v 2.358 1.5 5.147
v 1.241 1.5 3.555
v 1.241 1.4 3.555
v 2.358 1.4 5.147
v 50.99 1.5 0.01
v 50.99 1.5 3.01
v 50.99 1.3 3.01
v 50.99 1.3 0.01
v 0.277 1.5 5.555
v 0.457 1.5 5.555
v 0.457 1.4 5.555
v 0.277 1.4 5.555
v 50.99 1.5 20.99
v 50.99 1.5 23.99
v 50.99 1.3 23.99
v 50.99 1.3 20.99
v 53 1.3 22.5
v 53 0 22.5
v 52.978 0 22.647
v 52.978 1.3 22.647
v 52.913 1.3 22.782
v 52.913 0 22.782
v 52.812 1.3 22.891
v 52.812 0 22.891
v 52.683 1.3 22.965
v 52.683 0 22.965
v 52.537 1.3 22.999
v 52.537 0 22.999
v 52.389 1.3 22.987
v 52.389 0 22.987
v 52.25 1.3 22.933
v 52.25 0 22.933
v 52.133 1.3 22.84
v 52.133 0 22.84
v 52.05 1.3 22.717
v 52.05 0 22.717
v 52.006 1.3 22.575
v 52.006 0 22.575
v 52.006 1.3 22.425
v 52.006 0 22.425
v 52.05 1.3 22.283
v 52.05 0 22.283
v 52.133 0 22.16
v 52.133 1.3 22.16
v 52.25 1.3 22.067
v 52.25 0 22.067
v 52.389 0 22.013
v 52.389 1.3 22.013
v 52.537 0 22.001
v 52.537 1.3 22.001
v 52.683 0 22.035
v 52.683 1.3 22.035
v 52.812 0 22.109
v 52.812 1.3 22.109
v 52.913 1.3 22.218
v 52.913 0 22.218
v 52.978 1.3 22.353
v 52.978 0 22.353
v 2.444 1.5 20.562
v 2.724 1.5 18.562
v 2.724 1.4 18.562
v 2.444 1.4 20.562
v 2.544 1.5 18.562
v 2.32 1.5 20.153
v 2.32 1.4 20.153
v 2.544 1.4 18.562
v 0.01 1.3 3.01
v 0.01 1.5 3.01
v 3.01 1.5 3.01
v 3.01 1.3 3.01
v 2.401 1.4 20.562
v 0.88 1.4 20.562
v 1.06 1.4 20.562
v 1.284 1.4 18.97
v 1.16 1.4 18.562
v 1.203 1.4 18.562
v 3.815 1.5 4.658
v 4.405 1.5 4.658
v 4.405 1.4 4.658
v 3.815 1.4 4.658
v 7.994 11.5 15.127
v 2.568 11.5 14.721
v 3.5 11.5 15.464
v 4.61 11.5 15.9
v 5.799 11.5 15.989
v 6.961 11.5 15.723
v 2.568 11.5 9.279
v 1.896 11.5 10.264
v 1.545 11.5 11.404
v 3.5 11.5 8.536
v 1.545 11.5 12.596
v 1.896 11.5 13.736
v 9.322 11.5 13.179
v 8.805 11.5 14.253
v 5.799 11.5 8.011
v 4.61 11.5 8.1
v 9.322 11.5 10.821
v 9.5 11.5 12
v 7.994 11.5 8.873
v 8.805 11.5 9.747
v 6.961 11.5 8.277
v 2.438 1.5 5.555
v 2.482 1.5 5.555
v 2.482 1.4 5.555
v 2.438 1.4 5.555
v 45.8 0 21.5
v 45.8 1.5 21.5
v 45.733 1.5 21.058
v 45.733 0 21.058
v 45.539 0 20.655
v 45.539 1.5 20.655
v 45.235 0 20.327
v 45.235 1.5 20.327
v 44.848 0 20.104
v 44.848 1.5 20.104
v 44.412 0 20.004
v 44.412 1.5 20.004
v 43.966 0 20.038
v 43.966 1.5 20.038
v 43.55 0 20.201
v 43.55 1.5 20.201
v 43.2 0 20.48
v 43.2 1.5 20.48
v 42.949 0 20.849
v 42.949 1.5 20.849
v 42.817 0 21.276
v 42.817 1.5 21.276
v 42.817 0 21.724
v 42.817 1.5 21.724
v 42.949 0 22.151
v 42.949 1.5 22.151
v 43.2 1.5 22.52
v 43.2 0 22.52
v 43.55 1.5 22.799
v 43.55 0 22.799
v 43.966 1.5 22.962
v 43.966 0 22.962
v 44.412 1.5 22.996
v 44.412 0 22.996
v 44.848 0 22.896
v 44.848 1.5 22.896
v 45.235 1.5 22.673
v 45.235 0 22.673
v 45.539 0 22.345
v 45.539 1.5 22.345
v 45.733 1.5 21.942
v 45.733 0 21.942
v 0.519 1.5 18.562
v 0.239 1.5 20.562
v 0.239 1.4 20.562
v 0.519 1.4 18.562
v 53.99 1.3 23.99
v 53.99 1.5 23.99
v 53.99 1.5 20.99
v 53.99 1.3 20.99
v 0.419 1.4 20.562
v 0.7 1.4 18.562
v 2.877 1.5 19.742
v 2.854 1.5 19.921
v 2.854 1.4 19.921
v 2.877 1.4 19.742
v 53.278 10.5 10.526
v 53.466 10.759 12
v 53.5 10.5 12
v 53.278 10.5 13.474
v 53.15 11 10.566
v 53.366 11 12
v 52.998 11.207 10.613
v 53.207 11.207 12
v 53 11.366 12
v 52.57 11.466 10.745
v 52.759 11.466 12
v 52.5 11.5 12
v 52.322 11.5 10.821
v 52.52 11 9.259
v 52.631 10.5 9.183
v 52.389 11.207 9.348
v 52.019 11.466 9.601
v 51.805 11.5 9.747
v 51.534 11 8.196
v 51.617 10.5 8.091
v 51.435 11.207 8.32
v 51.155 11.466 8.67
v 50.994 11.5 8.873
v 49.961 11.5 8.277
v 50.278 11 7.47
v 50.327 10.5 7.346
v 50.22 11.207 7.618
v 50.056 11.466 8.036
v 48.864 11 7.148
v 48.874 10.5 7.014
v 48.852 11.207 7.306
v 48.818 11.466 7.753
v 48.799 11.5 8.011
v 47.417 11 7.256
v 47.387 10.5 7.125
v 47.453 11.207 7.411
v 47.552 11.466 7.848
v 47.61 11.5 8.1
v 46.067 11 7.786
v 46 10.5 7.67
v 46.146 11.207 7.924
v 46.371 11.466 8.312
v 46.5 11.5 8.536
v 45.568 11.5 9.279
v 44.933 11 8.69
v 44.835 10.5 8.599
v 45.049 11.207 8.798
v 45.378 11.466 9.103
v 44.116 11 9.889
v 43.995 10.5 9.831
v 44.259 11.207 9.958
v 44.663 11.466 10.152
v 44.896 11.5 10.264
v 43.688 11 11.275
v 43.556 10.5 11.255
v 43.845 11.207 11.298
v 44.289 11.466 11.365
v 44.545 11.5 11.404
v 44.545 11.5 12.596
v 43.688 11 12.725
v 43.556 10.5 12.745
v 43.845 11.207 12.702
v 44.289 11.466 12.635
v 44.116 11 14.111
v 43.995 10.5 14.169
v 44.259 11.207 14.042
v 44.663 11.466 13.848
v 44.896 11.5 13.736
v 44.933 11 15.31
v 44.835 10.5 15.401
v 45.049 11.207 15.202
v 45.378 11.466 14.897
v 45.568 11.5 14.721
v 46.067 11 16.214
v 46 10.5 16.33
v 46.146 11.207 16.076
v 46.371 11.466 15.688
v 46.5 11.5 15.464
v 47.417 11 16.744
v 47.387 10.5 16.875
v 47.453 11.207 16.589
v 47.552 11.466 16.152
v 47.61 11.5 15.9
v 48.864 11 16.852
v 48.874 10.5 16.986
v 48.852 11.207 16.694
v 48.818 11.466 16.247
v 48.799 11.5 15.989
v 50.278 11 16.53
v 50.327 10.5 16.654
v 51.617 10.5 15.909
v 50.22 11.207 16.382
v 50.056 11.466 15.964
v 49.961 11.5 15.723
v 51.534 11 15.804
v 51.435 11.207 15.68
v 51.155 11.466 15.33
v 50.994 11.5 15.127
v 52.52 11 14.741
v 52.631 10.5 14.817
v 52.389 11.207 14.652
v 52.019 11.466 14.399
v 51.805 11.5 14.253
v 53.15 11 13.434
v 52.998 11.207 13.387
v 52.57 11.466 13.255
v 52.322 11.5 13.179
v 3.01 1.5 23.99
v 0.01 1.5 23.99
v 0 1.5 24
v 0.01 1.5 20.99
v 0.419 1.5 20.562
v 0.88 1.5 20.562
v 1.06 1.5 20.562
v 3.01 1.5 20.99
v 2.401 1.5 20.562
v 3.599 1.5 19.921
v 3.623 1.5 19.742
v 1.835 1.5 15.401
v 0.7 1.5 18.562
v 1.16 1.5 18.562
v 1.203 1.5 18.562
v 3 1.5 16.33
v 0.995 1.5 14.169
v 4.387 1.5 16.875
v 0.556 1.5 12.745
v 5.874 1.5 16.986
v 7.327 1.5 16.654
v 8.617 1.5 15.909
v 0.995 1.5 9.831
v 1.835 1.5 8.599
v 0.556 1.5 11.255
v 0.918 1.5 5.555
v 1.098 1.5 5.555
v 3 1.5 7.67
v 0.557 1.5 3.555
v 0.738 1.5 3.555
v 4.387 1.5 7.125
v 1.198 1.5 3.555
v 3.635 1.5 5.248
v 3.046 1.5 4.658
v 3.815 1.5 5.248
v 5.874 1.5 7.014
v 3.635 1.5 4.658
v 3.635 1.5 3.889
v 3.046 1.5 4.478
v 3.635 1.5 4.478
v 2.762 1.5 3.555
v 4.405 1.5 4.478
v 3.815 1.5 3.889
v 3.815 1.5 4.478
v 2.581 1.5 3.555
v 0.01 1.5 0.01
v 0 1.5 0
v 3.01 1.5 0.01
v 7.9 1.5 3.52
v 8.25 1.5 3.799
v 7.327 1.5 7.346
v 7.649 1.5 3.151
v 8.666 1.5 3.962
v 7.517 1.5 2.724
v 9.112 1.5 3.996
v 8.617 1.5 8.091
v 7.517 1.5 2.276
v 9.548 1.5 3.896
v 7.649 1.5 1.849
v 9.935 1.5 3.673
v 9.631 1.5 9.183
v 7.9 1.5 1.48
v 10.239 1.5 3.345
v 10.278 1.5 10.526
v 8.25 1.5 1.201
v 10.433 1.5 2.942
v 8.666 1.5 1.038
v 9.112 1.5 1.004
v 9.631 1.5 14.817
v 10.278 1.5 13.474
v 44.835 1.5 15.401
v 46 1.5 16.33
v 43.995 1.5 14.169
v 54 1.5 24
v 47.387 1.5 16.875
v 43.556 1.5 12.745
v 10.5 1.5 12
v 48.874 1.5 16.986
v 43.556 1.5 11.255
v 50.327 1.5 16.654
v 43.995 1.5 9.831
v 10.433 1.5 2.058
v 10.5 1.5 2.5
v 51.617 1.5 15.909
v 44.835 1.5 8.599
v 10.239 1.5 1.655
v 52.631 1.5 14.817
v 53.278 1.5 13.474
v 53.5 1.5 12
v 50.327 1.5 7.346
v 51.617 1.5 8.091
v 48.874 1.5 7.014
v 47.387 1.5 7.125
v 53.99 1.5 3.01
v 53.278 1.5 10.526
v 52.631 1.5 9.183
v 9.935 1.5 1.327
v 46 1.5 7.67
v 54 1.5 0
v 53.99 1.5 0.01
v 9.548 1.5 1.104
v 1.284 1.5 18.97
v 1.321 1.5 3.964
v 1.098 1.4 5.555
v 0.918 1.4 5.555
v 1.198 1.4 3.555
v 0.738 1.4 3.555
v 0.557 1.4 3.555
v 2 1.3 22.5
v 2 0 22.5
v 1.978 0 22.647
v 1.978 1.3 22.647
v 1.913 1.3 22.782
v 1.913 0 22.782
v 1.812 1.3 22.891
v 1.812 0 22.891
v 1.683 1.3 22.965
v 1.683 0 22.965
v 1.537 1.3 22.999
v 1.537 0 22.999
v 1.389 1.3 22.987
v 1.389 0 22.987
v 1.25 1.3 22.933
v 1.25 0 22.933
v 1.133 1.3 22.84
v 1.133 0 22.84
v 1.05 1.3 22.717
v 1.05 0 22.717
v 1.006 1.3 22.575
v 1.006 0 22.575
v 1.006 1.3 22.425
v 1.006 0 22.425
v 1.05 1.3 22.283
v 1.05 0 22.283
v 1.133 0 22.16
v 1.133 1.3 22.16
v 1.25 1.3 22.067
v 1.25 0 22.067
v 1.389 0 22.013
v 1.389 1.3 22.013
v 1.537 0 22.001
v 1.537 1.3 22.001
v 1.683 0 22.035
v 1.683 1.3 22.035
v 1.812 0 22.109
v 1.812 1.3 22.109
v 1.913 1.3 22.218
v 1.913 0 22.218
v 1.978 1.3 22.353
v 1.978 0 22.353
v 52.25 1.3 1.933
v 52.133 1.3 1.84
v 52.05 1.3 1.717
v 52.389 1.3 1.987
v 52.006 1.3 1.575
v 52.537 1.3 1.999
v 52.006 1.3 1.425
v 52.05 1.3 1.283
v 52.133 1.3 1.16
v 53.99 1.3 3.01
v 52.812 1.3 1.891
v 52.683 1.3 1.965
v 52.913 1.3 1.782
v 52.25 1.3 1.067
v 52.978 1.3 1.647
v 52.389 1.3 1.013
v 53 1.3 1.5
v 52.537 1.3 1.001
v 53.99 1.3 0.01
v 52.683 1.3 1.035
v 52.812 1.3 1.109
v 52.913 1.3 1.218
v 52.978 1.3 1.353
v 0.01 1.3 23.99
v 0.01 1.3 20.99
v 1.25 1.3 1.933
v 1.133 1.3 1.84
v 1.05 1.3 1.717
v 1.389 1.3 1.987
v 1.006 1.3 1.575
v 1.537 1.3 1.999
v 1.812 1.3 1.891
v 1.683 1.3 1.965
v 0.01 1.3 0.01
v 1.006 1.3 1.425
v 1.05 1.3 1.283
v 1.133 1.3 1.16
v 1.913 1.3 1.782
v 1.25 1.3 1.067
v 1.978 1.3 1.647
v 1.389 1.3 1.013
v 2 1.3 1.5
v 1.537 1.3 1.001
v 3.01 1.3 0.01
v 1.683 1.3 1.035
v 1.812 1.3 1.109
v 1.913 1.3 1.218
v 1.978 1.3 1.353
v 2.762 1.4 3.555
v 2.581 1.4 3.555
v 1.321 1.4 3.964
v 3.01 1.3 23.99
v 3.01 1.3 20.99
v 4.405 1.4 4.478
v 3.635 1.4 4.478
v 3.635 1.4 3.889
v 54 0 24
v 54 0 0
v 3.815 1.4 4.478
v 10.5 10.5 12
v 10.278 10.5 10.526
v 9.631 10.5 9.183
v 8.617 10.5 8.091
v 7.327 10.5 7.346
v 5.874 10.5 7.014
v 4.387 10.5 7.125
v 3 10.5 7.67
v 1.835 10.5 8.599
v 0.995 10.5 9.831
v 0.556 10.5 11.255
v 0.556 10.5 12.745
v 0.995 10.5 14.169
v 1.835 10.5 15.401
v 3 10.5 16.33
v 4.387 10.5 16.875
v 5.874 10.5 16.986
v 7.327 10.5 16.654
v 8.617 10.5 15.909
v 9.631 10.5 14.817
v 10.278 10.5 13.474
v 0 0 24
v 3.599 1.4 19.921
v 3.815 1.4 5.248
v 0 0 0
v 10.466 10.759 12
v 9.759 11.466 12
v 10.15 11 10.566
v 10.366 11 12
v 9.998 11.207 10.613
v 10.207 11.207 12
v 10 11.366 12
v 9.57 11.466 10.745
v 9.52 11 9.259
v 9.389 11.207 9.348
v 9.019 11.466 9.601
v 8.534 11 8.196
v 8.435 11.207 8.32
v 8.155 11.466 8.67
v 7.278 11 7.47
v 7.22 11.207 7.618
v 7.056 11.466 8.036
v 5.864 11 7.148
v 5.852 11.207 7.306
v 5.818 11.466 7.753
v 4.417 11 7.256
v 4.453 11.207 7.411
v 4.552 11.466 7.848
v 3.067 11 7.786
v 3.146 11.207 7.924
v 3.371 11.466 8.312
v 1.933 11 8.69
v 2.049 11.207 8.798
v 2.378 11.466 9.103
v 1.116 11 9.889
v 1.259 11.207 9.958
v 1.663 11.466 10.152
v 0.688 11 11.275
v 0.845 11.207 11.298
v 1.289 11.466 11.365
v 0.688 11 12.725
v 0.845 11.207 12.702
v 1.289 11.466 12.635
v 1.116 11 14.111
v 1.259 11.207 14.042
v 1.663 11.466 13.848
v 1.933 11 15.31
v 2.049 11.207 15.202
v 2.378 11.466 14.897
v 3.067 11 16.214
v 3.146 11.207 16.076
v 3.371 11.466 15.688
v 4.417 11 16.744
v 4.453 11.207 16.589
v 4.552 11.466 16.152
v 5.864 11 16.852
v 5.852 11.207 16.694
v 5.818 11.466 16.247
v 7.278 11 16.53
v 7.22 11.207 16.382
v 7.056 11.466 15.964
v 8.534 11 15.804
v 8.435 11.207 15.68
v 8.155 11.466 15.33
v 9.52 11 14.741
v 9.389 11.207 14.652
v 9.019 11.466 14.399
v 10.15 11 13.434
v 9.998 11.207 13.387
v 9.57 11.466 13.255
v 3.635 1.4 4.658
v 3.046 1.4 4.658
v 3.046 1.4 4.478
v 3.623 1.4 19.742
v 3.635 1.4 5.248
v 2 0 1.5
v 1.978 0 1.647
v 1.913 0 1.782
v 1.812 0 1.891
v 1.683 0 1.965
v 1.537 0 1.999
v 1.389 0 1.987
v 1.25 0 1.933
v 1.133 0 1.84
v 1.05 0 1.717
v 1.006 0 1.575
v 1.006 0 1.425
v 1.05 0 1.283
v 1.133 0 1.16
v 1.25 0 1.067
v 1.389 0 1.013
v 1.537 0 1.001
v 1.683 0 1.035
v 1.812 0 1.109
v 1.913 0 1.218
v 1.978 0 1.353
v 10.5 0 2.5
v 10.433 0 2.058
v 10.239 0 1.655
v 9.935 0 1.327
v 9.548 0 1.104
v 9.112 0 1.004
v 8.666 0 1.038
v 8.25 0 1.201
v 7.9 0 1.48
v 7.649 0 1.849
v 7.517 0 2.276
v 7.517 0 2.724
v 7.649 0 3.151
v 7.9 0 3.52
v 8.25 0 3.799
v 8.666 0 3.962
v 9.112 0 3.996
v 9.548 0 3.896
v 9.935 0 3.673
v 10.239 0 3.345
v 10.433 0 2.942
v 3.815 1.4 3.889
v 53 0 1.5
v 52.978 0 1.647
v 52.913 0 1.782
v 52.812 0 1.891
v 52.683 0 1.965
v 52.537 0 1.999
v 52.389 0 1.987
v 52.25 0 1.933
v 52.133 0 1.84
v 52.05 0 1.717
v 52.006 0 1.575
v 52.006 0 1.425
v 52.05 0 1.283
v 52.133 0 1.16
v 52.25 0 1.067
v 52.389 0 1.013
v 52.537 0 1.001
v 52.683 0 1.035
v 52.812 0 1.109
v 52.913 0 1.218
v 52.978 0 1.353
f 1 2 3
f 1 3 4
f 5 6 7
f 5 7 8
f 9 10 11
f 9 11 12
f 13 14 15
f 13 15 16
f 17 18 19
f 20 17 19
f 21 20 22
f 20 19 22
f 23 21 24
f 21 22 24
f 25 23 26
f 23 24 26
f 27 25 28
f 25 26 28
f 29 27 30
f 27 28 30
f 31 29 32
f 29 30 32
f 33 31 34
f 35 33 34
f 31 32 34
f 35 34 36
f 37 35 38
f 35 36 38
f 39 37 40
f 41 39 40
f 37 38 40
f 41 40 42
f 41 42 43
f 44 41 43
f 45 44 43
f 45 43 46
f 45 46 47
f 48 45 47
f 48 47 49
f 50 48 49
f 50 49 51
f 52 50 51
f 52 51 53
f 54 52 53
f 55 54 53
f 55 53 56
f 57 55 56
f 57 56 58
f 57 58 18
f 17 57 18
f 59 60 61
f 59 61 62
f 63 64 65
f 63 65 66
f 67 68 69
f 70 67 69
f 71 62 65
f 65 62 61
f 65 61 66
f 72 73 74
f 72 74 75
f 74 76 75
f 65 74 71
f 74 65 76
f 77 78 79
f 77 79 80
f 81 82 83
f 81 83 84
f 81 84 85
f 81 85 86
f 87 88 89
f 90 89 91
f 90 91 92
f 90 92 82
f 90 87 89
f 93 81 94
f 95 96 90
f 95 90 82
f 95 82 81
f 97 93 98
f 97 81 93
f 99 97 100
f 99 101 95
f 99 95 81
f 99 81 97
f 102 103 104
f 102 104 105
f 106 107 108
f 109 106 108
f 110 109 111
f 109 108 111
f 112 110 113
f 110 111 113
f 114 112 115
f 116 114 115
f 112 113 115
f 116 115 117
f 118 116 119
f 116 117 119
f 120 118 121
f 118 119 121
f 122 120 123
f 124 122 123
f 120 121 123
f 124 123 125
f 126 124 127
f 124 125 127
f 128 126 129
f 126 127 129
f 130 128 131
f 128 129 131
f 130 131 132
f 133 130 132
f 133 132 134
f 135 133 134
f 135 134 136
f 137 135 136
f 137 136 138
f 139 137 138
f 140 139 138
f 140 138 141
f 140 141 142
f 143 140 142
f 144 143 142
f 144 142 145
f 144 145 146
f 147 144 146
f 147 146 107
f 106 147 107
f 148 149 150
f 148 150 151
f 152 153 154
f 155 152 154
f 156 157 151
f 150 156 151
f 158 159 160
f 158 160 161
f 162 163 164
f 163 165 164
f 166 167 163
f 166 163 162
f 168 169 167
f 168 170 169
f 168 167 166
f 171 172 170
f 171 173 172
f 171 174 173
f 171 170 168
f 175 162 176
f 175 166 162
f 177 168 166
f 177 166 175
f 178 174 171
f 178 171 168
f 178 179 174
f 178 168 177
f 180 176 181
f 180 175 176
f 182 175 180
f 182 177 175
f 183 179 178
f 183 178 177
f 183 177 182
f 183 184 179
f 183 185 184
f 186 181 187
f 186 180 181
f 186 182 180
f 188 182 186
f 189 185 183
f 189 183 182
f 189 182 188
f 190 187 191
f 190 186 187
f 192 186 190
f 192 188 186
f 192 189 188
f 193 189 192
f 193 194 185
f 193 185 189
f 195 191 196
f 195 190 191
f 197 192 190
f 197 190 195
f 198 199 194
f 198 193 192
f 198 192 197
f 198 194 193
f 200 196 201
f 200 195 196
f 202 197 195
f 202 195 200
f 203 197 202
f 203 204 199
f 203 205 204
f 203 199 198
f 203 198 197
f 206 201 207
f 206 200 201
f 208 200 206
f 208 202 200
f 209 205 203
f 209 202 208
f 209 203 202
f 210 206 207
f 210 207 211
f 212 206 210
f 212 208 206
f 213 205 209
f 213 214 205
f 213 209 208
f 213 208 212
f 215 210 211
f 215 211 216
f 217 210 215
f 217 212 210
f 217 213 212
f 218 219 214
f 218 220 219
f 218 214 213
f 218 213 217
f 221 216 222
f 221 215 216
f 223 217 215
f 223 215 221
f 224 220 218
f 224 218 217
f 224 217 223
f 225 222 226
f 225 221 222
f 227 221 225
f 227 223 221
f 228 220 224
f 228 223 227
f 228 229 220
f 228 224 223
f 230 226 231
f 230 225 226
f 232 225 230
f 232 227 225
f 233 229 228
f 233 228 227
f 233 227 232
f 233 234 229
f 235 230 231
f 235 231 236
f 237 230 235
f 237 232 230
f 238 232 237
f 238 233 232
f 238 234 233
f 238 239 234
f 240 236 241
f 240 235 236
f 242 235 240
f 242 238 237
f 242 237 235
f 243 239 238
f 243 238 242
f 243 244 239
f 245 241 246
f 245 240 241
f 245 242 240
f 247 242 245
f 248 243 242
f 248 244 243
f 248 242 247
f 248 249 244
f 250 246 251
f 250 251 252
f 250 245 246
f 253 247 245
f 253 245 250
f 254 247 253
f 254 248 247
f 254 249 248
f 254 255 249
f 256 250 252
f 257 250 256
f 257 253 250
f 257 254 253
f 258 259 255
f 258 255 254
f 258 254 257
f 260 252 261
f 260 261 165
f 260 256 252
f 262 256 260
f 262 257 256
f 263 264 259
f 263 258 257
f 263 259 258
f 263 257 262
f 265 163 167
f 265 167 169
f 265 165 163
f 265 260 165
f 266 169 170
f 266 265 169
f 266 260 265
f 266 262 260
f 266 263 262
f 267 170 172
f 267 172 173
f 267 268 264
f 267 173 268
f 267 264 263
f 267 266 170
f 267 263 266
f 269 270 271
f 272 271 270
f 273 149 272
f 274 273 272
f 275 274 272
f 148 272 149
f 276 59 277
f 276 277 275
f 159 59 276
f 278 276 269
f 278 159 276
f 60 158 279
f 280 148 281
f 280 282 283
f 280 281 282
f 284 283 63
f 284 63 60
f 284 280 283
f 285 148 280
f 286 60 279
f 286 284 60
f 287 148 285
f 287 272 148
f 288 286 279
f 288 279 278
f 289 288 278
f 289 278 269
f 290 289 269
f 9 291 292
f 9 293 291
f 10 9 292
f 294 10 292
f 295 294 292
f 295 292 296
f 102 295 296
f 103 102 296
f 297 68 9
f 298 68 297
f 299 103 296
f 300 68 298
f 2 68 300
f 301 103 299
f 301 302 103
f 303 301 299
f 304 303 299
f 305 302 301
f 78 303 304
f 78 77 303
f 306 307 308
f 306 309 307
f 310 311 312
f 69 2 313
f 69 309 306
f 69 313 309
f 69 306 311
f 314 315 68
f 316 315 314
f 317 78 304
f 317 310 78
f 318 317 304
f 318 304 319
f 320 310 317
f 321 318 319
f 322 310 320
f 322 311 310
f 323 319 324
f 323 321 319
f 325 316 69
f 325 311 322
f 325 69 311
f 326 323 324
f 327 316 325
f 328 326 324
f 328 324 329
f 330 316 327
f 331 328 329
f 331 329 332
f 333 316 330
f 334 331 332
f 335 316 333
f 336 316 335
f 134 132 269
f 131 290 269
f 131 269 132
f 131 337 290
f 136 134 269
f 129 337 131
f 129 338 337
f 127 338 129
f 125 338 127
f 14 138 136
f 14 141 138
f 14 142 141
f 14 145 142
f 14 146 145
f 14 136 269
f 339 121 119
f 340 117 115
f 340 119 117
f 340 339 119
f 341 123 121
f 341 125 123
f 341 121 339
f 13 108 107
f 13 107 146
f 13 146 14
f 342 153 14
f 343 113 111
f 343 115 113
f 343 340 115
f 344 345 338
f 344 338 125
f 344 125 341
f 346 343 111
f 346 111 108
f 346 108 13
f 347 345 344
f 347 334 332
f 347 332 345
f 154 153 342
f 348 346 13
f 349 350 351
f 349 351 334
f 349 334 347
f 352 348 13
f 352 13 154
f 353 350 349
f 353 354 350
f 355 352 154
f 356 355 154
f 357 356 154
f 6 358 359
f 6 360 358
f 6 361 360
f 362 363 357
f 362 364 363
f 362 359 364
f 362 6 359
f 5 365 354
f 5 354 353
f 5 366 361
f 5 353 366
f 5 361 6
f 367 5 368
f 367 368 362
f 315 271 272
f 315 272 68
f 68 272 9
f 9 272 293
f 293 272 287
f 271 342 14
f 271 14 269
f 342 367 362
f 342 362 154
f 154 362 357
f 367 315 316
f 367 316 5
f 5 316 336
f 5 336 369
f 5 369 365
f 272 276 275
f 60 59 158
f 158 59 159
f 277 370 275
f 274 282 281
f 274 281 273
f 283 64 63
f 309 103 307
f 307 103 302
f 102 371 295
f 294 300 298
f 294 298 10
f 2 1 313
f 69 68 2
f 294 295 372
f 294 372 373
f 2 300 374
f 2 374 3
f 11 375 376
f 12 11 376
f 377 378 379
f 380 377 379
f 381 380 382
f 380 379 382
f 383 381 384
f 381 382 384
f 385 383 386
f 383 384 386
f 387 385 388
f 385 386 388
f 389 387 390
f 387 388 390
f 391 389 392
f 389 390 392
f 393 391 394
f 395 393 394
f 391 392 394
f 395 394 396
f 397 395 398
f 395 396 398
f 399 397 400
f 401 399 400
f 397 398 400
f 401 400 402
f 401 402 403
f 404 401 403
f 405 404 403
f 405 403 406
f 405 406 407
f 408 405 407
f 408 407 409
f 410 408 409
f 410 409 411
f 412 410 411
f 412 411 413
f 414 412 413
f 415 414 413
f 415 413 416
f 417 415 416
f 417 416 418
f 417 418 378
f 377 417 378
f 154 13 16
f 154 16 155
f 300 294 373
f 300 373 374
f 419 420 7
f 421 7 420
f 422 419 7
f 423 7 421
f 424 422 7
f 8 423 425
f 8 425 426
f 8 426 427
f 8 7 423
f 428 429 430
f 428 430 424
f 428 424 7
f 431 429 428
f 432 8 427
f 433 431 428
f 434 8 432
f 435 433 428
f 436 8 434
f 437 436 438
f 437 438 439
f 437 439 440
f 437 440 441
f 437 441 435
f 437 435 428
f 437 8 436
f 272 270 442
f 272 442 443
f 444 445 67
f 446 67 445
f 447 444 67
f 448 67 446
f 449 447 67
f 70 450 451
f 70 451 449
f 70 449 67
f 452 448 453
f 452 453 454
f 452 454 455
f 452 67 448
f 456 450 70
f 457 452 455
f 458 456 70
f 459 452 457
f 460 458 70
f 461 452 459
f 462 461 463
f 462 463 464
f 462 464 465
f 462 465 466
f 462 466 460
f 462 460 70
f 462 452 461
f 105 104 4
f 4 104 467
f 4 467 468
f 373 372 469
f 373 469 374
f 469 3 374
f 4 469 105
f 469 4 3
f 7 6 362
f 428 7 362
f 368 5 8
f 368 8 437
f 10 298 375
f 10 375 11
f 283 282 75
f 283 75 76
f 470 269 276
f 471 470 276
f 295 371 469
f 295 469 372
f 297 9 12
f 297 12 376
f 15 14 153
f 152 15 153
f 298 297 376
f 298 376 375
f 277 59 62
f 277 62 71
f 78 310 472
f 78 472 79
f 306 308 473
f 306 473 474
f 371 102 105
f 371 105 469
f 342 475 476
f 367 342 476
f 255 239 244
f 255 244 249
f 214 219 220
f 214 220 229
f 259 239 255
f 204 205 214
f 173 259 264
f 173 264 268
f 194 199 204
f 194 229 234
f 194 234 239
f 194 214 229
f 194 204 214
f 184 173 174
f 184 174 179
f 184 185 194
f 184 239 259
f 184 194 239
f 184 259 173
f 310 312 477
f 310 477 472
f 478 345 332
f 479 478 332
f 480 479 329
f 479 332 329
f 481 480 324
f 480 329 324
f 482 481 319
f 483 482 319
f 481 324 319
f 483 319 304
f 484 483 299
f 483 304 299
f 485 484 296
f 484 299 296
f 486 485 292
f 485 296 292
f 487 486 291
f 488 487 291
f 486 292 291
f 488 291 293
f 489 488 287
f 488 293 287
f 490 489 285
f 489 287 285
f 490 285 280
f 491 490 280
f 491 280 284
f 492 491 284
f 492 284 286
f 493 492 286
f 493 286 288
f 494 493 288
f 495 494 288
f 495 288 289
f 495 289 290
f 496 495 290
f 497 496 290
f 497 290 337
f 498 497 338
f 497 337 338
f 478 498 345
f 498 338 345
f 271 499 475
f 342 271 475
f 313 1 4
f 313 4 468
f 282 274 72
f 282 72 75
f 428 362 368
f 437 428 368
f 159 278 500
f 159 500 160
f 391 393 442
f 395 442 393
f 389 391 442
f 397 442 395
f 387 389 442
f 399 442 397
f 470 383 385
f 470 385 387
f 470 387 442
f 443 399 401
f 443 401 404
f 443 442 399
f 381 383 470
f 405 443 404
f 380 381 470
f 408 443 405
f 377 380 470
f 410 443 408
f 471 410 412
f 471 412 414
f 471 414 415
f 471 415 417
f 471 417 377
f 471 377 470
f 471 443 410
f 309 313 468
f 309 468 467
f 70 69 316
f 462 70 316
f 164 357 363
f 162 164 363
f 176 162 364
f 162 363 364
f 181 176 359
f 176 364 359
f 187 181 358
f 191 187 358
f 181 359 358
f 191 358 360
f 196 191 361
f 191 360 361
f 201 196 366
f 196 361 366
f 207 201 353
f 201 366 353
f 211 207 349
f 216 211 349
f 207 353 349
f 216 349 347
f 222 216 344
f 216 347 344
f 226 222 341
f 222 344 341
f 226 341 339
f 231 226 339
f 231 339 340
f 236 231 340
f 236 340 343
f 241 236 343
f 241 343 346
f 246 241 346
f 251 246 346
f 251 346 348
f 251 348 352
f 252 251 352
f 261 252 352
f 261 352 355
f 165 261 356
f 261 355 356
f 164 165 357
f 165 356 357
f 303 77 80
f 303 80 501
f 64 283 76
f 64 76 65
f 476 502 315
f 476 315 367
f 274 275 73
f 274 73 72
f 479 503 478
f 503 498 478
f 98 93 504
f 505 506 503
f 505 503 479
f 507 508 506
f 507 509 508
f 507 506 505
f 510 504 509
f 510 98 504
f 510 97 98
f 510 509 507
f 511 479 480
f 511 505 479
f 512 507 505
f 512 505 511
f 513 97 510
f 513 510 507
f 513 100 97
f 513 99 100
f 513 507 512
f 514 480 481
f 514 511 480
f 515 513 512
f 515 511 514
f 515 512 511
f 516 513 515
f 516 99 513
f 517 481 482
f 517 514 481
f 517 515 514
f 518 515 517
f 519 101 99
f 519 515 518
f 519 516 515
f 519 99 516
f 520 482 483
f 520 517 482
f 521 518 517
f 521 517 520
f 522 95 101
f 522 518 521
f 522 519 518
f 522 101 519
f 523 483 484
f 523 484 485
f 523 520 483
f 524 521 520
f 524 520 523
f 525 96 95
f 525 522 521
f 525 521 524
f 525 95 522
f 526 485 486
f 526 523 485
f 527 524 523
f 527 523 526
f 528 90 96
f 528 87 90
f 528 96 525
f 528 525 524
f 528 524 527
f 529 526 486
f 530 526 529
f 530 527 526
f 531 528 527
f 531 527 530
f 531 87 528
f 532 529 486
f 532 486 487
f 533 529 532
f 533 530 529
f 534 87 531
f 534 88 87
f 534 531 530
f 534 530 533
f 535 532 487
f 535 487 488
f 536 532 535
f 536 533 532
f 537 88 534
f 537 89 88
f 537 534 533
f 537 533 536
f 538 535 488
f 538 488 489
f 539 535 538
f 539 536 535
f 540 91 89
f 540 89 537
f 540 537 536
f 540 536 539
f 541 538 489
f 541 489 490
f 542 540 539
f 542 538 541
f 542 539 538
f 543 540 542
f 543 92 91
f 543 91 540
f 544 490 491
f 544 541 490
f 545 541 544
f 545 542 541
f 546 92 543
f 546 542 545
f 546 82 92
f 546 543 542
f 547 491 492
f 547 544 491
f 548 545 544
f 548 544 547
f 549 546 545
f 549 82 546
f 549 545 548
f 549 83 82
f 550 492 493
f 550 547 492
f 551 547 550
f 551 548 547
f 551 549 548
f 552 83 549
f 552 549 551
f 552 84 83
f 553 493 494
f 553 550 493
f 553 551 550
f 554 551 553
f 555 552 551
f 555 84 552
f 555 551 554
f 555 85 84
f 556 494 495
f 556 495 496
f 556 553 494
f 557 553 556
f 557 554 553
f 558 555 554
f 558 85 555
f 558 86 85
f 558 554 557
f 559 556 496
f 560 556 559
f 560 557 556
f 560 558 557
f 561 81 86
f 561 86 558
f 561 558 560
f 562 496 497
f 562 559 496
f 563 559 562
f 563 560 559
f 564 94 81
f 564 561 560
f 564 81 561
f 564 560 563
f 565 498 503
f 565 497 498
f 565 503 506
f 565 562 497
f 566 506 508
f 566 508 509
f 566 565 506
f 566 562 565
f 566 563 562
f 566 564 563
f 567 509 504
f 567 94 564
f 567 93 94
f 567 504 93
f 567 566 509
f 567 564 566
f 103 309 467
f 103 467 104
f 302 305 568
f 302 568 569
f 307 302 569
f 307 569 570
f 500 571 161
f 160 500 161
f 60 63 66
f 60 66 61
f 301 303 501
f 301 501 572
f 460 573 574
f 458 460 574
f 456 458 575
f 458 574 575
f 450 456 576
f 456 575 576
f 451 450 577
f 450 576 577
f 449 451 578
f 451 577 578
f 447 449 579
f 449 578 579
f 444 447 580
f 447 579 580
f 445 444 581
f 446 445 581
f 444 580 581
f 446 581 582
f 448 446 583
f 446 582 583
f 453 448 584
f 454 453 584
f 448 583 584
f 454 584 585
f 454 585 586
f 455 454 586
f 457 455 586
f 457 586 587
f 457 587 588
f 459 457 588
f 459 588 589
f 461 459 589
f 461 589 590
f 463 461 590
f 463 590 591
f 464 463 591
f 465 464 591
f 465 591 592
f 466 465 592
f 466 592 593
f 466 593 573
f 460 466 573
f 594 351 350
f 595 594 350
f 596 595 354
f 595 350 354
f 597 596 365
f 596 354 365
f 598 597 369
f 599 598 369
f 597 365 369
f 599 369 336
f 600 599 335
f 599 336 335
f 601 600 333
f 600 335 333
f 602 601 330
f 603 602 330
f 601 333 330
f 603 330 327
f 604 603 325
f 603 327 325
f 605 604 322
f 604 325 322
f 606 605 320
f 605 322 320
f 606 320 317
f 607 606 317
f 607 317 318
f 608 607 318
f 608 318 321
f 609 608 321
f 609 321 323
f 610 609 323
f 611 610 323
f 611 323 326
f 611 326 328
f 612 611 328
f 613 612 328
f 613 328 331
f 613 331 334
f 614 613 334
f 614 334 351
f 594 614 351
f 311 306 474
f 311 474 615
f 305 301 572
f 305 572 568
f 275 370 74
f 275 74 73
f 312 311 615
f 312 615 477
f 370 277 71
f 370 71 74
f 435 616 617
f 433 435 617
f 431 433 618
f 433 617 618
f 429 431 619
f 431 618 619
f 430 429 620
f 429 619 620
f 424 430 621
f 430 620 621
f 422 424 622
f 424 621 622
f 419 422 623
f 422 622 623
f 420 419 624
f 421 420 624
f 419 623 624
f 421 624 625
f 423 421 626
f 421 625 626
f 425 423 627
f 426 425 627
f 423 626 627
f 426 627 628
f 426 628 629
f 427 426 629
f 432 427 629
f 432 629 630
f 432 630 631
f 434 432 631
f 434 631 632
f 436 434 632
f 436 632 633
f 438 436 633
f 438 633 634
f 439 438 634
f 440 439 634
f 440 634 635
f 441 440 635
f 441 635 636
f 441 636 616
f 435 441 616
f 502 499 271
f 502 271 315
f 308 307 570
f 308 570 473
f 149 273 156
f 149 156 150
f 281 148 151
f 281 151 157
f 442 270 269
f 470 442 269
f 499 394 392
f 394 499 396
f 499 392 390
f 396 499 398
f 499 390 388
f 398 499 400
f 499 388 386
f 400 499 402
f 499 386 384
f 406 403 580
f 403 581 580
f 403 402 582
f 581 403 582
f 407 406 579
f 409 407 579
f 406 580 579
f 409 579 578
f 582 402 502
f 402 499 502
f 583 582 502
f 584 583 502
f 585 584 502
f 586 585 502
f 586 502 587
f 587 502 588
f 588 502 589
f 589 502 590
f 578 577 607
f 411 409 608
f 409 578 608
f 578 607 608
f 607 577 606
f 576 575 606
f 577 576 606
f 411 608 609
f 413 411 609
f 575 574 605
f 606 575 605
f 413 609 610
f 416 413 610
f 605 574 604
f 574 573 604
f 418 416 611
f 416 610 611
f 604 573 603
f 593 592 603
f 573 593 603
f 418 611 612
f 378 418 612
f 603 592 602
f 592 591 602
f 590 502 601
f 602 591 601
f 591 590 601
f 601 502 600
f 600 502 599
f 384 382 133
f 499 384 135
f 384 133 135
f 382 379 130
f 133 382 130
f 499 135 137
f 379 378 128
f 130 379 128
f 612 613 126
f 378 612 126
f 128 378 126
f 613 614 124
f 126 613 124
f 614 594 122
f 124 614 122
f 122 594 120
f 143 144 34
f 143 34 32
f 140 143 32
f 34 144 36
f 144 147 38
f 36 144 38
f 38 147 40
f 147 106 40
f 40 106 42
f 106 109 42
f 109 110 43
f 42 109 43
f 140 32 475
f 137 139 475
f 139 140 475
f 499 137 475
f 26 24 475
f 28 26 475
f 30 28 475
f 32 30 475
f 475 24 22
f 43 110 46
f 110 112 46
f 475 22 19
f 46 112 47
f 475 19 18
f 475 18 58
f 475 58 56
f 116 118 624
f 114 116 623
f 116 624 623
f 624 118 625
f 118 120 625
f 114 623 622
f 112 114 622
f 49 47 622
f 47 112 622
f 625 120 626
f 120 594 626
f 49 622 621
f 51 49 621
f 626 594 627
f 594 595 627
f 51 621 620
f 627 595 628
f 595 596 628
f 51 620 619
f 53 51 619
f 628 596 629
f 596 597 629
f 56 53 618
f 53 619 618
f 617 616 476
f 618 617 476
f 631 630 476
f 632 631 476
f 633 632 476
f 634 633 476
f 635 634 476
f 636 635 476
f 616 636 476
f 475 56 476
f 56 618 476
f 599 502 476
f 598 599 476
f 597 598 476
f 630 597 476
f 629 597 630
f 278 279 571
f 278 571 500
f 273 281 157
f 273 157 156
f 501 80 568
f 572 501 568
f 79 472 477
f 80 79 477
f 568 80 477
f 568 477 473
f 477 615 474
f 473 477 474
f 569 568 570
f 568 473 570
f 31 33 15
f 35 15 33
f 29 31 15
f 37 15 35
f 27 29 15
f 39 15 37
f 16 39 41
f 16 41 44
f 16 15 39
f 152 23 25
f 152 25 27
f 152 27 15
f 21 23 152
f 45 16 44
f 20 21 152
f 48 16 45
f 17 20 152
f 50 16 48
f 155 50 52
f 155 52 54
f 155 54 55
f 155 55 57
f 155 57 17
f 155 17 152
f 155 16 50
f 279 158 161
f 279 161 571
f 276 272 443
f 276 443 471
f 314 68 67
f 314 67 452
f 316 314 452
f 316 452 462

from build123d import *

# Parameters (mm, degrees)
SKETCH1_W           = 54
SKETCH1_H           = 24
BOSS_EXTRUDE1_DEPTH = 1.5
CUT_EXTRUDE1_REACH  = 3.5
SKETCH2_R           = 1.5
SKETCH4_W           = 3
SKETCH4_H           = 3
CUT_EXTRUDE2_DEPTH  = 0.2
CUT_EXTRUDE3_REACH  = 3.5
SKETCH5_R           = 0.5
CUT_EXTRUDE4_DEPTH  = 0.1
CUT_EXTRUDE5_DEPTH  = 0.1
SKETCH10_R          = 5
BOSS_EXTRUDE2_DEPTH = 10
FILLET1_R           = 1


with BuildPart() as part:
    # Sketch1 → Boss-Extrude1 (new body)
    with BuildSketch(Plane(origin=(0, 0, 0), x_dir=(1, 0, 0), z_dir=(0, 1, 0))):
        with Locations((27, -12)):
            Rectangle(SKETCH1_W, SKETCH1_H)
    extrude(amount=BOSS_EXTRUDE1_DEPTH)

    # Sketch2 → Cut-Extrude1 (cut, up to next)
    with BuildSketch(Plane(origin=(0, 1.5, 0), x_dir=(1, 0, 0), z_dir=(0, 1, 0)), mode=Mode.PRIVATE) as cut_extrude1_sk1:
        with Locations((9, -2.5)):
            Circle(SKETCH2_R)
    cut_extrude1_tool1 = extrude(cut_extrude1_sk1.sketch, amount=-CUT_EXTRUDE1_REACH, mode=Mode.PRIVATE) & part.part
    add(cut_extrude1_tool1.solids().sort_by_distance((9, 1.5, 2.5))[0], mode=Mode.SUBTRACT)
    # Sketch2 → Cut-Extrude1 (cut, up to next)
    with BuildSketch(Plane(origin=(0, 1.5, 0), x_dir=(1, 0, 0), z_dir=(0, 1, 0)), mode=Mode.PRIVATE) as cut_extrude1_sk2:
        with Locations((44.3, -21.5)):
            Circle(SKETCH2_R)
    cut_extrude1_tool2 = extrude(cut_extrude1_sk2.sketch, amount=-CUT_EXTRUDE1_REACH, mode=Mode.PRIVATE) & part.part
    add(cut_extrude1_tool2.solids().sort_by_distance((44.3, 1.5, 21.5))[0], mode=Mode.SUBTRACT)

    # Sketch4 → Cut-Extrude2 (cut)
    with BuildSketch(Plane(origin=(0, 1.5, 0), x_dir=(1, 0, 0), z_dir=(0, 1, 0))):
        with Locations((1.51, -1.51)):
            Rectangle(SKETCH4_W, SKETCH4_H)
        with Locations((52.49, -1.51)):
            Rectangle(SKETCH4_W, SKETCH4_H)
        with Locations((1.51, -22.49)):
            Rectangle(SKETCH4_W, SKETCH4_H)
        with Locations((52.49, -22.49)):
            Rectangle(SKETCH4_W, SKETCH4_H)
    extrude(amount=-CUT_EXTRUDE2_DEPTH, mode=Mode.SUBTRACT)

    # Sketch5 → Cut-Extrude3 (cut, up to next)
    with BuildSketch(Plane.XZ, mode=Mode.PRIVATE) as cut_extrude3_sk1:
        with Locations((52.5, 1.5)):
            Circle(SKETCH5_R)
    cut_extrude3_tool1 = extrude(cut_extrude3_sk1.sketch, amount=-CUT_EXTRUDE3_REACH, mode=Mode.PRIVATE) & part.part
    add(cut_extrude3_tool1.solids().sort_by_distance((52.5, 0, 1.5))[0], mode=Mode.SUBTRACT)
    # Sketch5 → Cut-Extrude3 (cut, up to next)
    with BuildSketch(Plane.XZ, mode=Mode.PRIVATE) as cut_extrude3_sk2:
        with Locations((52.5, 22.5)):
            Circle(SKETCH5_R)
    cut_extrude3_tool2 = extrude(cut_extrude3_sk2.sketch, amount=-CUT_EXTRUDE3_REACH, mode=Mode.PRIVATE) & part.part
    add(cut_extrude3_tool2.solids().sort_by_distance((52.5, 0, 22.5))[0], mode=Mode.SUBTRACT)
    # Sketch5 → Cut-Extrude3 (cut, up to next)
    with BuildSketch(Plane.XZ, mode=Mode.PRIVATE) as cut_extrude3_sk3:
        with Locations((1.5, 1.5)):
            Circle(SKETCH5_R)
    cut_extrude3_tool3 = extrude(cut_extrude3_sk3.sketch, amount=-CUT_EXTRUDE3_REACH, mode=Mode.PRIVATE) & part.part
    add(cut_extrude3_tool3.solids().sort_by_distance((1.5, 0, 1.5))[0], mode=Mode.SUBTRACT)
    # Sketch5 → Cut-Extrude3 (cut, up to next)
    with BuildSketch(Plane.XZ, mode=Mode.PRIVATE) as cut_extrude3_sk4:
        with Locations((1.5, 22.5)):
            Circle(SKETCH5_R)
    cut_extrude3_tool4 = extrude(cut_extrude3_sk4.sketch, amount=-CUT_EXTRUDE3_REACH, mode=Mode.PRIVATE) & part.part
    add(cut_extrude3_tool4.solids().sort_by_distance((1.5, 0, 22.5))[0], mode=Mode.SUBTRACT)

    # Sketch8 → Cut-Extrude4 (cut)
    with BuildSketch(Plane(origin=(0, 1.5, 0), x_dir=(1, 0, 0), z_dir=(0, 1, 0))):
        Polygon((0.556961838, -3.555375385), (0.73765094, -3.555375385), (0.457202222, -5.555375385), (0.27651312, -5.555375385), align=None)
        Polygon((2.58140094, -3.555375385), (2.762090043, -3.555375385), (2.481641325, -5.555375385), (2.438372094, -5.555375385), (1.321384915, -3.96362859), (1.098227863, -5.555375385), (0.917538761, -5.555375385), (1.197987479, -3.555375385), (1.24125671, -3.555375385), (2.357843248, -5.146721539), align=None)
        Polygon((3.635487479, -4.478452308), (3.635487479, -3.888708718), (3.814974658, -3.888708718), (3.814974658, -4.478452308), (4.404718248, -4.478452308), (4.404718248, -4.657939488), (3.814974658, -4.657939488), (3.814974658, -5.247683077), (3.635487479, -5.247683077), (3.635487479, -4.657939488), (3.045743889, -4.657939488), (3.045743889, -4.478452308), align=None)
    extrude(amount=-CUT_EXTRUDE4_DEPTH, mode=Mode.SUBTRACT)

    # Sketch9 → Cut-Extrude5 (cut)
    with BuildSketch(Plane(origin=(0, 1.5, 0), x_dir=(1, 0, 0), z_dir=(0, 1, 0))):
        Polygon((0.519157464, -18.562132586), (0.699846567, -18.562132586), (0.419397849, -20.562132586), (0.238708746, -20.562132586), align=None)
        Polygon((2.543596567, -18.562132586), (2.724285669, -18.562132586), (2.443836951, -20.562132586), (2.40056772, -20.562132586), (1.283580541, -18.970385792), (1.06042349, -20.562132586), (0.879734387, -20.562132586), (1.160183105, -18.562132586), (1.203452336, -18.562132586), (2.320038874, -20.15347874), align=None)
        Polygon((2.8769299, -19.741619766), (3.623324131, -19.741619766), (3.598885028, -19.921106945), (2.854093361, -19.921106945), align=None)
    extrude(amount=-CUT_EXTRUDE5_DEPTH, mode=Mode.SUBTRACT)

    # Sketch10 → Boss-Extrude2 (add)
    with BuildSketch(Plane(origin=(0, 1.5, 0), x_dir=(1, 0, 0), z_dir=(0, 1, 0))):
        with Locations((5.5, -12)):
            Circle(SKETCH10_R)
        with Locations((48.5, -12)):
            Circle(SKETCH10_R)
    extrude(amount=BOSS_EXTRUDE2_DEPTH)

    # Fillet1
    fillet1_edges = [part.edges().sort_by_distance(p)[0] for p in [
        (0.5, 11.5, 12),
        (43.5, 11.5, 12),
    ]]
    fillet(fillet1_edges, radius=FILLET1_R)


solid = part.part
